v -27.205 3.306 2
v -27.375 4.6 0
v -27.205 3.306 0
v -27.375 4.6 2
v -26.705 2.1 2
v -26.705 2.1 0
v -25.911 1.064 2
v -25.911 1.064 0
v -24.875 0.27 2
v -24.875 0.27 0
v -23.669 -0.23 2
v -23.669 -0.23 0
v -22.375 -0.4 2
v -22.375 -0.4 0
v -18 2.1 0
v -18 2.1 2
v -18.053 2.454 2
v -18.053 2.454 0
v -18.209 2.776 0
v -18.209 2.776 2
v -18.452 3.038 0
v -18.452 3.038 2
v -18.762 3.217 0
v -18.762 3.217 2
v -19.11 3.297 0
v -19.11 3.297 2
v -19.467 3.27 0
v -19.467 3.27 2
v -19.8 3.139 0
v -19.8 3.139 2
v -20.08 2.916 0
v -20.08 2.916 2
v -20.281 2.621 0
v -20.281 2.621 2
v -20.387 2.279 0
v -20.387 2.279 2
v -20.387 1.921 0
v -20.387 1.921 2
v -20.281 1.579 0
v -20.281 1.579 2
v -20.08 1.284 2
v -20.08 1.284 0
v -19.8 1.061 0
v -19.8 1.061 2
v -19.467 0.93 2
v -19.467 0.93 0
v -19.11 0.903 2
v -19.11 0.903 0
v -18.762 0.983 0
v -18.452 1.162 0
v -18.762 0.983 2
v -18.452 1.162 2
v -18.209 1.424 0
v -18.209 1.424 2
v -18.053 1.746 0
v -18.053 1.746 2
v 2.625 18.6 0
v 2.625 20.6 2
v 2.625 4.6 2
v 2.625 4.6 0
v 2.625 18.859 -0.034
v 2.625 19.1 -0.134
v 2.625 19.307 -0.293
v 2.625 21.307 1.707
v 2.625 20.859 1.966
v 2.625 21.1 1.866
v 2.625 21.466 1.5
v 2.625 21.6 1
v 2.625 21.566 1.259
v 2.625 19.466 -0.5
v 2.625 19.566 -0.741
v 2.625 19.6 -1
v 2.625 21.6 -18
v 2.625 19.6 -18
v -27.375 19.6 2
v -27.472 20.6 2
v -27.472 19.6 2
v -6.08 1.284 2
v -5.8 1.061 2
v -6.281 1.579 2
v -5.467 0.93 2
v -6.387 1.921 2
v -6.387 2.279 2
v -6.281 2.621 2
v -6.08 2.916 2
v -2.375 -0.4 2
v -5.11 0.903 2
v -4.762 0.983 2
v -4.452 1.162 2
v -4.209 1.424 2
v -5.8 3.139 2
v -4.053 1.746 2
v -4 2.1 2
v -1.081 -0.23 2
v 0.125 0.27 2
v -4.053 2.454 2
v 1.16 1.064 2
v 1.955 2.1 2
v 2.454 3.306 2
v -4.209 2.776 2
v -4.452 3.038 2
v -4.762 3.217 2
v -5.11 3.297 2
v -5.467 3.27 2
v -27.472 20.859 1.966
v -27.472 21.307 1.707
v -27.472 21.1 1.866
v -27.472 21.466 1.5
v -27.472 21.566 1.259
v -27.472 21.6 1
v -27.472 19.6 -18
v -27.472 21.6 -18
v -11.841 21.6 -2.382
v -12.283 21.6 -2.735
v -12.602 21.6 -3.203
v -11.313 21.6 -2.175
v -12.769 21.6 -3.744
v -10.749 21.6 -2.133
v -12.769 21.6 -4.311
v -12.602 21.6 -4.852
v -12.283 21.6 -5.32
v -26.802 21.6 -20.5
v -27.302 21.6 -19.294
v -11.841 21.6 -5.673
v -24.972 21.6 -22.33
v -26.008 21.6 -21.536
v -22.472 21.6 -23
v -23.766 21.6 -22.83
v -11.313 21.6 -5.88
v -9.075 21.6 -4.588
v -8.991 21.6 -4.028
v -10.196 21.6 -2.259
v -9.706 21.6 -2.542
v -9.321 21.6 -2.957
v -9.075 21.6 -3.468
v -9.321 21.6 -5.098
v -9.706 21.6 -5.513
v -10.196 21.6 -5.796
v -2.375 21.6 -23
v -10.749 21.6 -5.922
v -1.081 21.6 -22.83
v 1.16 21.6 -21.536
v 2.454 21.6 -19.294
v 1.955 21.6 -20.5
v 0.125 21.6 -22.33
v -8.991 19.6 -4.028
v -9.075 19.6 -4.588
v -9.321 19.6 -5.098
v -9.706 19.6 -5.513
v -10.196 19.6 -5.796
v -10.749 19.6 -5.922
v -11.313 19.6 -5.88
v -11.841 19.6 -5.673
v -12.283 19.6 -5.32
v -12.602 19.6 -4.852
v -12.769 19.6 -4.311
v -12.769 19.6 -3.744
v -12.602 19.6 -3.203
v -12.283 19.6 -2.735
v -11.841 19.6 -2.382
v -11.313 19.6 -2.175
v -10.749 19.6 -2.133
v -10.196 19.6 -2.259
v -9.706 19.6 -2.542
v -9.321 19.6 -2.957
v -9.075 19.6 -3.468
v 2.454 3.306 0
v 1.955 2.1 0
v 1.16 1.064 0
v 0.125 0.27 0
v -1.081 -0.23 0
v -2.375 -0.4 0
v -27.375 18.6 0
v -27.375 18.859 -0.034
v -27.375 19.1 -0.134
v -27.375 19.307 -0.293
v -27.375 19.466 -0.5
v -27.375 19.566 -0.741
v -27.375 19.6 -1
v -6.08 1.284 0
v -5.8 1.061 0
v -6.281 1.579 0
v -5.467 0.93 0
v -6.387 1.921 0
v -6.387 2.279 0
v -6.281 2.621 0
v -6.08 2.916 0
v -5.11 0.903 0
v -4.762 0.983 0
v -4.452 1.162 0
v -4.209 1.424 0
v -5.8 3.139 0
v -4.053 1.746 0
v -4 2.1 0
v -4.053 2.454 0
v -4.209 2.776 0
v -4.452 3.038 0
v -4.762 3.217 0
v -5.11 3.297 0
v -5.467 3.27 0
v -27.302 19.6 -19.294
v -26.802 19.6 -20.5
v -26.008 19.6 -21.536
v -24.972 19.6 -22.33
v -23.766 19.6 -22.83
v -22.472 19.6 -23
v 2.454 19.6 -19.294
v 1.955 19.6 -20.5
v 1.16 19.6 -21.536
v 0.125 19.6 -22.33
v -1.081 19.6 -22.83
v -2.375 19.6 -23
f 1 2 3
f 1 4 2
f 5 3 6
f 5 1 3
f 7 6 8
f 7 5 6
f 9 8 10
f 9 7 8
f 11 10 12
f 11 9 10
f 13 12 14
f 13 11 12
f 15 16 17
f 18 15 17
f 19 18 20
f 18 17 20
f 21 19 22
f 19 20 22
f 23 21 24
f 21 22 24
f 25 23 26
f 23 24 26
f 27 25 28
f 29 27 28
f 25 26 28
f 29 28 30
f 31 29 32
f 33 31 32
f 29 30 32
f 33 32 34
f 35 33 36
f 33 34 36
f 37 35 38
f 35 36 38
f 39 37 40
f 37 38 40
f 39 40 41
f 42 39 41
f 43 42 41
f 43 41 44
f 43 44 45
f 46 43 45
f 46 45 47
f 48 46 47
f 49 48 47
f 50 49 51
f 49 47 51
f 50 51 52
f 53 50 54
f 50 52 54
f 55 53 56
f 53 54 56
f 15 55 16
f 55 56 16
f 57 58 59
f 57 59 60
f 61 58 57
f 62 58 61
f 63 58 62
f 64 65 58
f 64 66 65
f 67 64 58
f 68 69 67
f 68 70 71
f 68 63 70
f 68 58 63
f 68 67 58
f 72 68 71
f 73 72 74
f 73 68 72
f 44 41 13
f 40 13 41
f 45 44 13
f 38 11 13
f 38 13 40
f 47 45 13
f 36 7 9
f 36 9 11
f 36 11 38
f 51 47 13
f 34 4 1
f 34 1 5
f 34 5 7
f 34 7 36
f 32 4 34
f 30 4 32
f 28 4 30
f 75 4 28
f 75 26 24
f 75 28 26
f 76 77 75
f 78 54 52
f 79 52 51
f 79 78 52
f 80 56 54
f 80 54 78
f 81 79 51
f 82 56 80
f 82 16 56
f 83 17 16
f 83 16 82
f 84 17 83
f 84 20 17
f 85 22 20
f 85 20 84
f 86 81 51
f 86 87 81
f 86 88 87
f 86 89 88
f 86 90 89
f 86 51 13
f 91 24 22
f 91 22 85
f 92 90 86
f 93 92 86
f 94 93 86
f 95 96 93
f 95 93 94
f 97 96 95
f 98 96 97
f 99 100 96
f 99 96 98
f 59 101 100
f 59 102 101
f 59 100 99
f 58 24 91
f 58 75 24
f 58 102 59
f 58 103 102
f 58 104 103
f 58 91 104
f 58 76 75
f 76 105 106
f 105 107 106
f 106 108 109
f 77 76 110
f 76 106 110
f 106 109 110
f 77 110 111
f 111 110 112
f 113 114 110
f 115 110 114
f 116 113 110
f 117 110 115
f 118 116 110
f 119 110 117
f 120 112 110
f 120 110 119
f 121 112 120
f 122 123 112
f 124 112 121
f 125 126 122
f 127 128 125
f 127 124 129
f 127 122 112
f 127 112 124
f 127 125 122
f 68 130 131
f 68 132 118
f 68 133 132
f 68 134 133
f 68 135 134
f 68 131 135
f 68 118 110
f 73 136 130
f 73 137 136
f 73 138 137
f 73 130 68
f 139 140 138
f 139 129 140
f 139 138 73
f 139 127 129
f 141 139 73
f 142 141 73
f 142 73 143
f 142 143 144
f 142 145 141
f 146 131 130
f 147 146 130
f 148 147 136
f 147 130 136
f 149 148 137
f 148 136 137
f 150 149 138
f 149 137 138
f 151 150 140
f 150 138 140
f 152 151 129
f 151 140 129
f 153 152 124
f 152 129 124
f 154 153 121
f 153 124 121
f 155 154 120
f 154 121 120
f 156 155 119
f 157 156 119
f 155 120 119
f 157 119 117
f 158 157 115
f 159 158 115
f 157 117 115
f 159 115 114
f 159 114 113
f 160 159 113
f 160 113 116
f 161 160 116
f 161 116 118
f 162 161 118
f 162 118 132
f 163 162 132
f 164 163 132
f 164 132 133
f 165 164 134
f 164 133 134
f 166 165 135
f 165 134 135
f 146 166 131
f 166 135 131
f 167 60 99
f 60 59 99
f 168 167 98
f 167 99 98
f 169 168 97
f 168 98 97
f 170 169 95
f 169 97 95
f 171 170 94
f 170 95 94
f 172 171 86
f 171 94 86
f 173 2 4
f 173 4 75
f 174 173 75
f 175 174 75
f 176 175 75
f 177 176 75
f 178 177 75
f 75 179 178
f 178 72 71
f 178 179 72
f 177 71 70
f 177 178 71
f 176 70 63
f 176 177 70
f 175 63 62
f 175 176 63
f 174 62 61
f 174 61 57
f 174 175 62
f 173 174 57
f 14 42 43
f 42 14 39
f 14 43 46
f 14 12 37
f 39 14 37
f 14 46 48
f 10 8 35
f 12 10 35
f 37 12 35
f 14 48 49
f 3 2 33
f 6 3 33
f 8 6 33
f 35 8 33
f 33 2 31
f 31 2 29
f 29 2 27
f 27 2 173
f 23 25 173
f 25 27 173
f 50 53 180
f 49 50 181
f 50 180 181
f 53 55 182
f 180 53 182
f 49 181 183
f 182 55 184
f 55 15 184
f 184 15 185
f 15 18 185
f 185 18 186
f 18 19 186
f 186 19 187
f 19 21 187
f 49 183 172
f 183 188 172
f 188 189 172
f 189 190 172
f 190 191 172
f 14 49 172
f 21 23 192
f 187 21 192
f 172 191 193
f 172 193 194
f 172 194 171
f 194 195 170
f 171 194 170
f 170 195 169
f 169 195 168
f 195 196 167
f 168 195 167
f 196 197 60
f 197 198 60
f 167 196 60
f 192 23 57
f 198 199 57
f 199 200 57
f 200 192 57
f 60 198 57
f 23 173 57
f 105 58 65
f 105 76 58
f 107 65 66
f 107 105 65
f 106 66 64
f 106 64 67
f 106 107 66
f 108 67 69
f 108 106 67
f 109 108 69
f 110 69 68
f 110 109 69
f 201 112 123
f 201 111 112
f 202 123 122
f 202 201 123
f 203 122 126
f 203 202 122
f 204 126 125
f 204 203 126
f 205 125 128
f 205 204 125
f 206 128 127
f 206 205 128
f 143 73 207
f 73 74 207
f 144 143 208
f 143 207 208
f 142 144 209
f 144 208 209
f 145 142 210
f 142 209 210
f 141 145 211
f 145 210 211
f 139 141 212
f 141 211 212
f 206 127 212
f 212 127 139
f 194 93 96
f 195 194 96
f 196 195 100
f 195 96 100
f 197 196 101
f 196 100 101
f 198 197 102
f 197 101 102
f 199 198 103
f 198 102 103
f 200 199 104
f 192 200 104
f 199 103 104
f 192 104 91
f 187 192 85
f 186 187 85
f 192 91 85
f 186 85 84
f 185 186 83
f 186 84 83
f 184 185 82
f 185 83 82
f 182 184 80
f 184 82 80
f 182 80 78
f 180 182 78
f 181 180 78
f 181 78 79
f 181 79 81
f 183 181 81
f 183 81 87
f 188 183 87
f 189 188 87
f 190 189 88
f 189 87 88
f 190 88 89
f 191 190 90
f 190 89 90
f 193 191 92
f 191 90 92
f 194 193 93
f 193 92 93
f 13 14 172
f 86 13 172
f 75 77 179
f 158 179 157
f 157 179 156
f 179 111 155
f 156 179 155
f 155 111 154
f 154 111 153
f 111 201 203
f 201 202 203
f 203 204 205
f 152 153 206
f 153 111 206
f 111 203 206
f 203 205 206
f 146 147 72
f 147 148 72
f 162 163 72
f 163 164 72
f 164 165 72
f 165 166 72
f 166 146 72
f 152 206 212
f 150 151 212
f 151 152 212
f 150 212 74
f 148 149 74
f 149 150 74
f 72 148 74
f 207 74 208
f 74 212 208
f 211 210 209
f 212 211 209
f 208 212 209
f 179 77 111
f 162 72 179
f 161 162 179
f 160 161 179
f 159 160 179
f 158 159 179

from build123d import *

# Parameters (mm, degrees)
SKETCH2_W           = 30
SKETCH2_H           = 22
BOSS_EXTRUDE1_DEPTH = 2
SKETCH3_W           = 30.097036207
SKETCH3_H           = 25
BOSS_EXTRUDE2_DEPTH = 2
SKETCH4_R           = 1.2
CUT_EXTRUDE1_DEPTH  = 2
FILLET1_R           = 1
FILLET2_R           = 1
FILLET3_R           = 5
FILLET4_R           = 5
SKETCH5_R           = 1.9
CUT_EXTRUDE2_DEPTH  = 2


with BuildPart() as part:
    # Sketch2 → Boss-Extrude1 (new body)
    with BuildSketch(Plane.XY):
        with Locations((-12.375323898, 10.6)):
            Rectangle(SKETCH2_W, SKETCH2_H)
    extrude(amount=BOSS_EXTRUDE1_DEPTH)

    # Sketch3 → Boss-Extrude2 (add)
    with BuildSketch(Plane(origin=(0, 21.6, 0), x_dir=(1, 0, 0), z_dir=(0, 1, 0))):
        with Locations((-12.423842002, 10.5)):
            Rectangle(SKETCH3_W, SKETCH3_H)
    extrude(amount=-BOSS_EXTRUDE2_DEPTH)

    # Sketch4 → Cut-Extrude1 (cut)
    with BuildSketch(Plane.XY.offset(2)):
        with Locations((-5.2, 2.1)):
            Circle(SKETCH4_R)
        with Locations((-19.2, 2.1)):
            Circle(SKETCH4_R)
    extrude(amount=-CUT_EXTRUDE1_DEPTH, mode=Mode.SUBTRACT)

    # Fillet1
    fillet1_edges = [part.edges().sort_by_distance(p)[0] for p in [
        (-12.375323898, 19.6, 0),
    ]]
    fillet(fillet1_edges, radius=FILLET1_R)

    # Fillet2
    fillet2_edges = [part.edges().sort_by_distance(p)[0] for p in [
        (-12.423842002, 21.6, 2),
    ]]
    fillet(fillet2_edges, radius=FILLET2_R)

    # Fillet3
    fillet3_edges = [part.edges().sort_by_distance(p)[0] for p in [
        (2.624676102, -0.4, 1),
        (-27.375323898, -0.4, 1),
    ]]
    fillet(fillet3_edges, radius=FILLET3_R)

    # Fillet4
    fillet4_edges = [part.edges().sort_by_distance(p)[0] for p in [
        (2.624676102, 20.6, -23),
        (-27.472360105, 20.6, -23),
    ]]
    fillet(fillet4_edges, radius=FILLET4_R)

    # Sketch5 → Cut-Extrude2 (cut)
    with BuildSketch(Plane(origin=(0, 21.6, 0), x_dir=(1, 0, 0), z_dir=(0, 1, 0))):
        with Locations((-10.890638189, 4.027670227)):
            Circle(SKETCH5_R)
    extrude(amount=-CUT_EXTRUDE2_DEPTH, mode=Mode.SUBTRACT)


solid = part.part
